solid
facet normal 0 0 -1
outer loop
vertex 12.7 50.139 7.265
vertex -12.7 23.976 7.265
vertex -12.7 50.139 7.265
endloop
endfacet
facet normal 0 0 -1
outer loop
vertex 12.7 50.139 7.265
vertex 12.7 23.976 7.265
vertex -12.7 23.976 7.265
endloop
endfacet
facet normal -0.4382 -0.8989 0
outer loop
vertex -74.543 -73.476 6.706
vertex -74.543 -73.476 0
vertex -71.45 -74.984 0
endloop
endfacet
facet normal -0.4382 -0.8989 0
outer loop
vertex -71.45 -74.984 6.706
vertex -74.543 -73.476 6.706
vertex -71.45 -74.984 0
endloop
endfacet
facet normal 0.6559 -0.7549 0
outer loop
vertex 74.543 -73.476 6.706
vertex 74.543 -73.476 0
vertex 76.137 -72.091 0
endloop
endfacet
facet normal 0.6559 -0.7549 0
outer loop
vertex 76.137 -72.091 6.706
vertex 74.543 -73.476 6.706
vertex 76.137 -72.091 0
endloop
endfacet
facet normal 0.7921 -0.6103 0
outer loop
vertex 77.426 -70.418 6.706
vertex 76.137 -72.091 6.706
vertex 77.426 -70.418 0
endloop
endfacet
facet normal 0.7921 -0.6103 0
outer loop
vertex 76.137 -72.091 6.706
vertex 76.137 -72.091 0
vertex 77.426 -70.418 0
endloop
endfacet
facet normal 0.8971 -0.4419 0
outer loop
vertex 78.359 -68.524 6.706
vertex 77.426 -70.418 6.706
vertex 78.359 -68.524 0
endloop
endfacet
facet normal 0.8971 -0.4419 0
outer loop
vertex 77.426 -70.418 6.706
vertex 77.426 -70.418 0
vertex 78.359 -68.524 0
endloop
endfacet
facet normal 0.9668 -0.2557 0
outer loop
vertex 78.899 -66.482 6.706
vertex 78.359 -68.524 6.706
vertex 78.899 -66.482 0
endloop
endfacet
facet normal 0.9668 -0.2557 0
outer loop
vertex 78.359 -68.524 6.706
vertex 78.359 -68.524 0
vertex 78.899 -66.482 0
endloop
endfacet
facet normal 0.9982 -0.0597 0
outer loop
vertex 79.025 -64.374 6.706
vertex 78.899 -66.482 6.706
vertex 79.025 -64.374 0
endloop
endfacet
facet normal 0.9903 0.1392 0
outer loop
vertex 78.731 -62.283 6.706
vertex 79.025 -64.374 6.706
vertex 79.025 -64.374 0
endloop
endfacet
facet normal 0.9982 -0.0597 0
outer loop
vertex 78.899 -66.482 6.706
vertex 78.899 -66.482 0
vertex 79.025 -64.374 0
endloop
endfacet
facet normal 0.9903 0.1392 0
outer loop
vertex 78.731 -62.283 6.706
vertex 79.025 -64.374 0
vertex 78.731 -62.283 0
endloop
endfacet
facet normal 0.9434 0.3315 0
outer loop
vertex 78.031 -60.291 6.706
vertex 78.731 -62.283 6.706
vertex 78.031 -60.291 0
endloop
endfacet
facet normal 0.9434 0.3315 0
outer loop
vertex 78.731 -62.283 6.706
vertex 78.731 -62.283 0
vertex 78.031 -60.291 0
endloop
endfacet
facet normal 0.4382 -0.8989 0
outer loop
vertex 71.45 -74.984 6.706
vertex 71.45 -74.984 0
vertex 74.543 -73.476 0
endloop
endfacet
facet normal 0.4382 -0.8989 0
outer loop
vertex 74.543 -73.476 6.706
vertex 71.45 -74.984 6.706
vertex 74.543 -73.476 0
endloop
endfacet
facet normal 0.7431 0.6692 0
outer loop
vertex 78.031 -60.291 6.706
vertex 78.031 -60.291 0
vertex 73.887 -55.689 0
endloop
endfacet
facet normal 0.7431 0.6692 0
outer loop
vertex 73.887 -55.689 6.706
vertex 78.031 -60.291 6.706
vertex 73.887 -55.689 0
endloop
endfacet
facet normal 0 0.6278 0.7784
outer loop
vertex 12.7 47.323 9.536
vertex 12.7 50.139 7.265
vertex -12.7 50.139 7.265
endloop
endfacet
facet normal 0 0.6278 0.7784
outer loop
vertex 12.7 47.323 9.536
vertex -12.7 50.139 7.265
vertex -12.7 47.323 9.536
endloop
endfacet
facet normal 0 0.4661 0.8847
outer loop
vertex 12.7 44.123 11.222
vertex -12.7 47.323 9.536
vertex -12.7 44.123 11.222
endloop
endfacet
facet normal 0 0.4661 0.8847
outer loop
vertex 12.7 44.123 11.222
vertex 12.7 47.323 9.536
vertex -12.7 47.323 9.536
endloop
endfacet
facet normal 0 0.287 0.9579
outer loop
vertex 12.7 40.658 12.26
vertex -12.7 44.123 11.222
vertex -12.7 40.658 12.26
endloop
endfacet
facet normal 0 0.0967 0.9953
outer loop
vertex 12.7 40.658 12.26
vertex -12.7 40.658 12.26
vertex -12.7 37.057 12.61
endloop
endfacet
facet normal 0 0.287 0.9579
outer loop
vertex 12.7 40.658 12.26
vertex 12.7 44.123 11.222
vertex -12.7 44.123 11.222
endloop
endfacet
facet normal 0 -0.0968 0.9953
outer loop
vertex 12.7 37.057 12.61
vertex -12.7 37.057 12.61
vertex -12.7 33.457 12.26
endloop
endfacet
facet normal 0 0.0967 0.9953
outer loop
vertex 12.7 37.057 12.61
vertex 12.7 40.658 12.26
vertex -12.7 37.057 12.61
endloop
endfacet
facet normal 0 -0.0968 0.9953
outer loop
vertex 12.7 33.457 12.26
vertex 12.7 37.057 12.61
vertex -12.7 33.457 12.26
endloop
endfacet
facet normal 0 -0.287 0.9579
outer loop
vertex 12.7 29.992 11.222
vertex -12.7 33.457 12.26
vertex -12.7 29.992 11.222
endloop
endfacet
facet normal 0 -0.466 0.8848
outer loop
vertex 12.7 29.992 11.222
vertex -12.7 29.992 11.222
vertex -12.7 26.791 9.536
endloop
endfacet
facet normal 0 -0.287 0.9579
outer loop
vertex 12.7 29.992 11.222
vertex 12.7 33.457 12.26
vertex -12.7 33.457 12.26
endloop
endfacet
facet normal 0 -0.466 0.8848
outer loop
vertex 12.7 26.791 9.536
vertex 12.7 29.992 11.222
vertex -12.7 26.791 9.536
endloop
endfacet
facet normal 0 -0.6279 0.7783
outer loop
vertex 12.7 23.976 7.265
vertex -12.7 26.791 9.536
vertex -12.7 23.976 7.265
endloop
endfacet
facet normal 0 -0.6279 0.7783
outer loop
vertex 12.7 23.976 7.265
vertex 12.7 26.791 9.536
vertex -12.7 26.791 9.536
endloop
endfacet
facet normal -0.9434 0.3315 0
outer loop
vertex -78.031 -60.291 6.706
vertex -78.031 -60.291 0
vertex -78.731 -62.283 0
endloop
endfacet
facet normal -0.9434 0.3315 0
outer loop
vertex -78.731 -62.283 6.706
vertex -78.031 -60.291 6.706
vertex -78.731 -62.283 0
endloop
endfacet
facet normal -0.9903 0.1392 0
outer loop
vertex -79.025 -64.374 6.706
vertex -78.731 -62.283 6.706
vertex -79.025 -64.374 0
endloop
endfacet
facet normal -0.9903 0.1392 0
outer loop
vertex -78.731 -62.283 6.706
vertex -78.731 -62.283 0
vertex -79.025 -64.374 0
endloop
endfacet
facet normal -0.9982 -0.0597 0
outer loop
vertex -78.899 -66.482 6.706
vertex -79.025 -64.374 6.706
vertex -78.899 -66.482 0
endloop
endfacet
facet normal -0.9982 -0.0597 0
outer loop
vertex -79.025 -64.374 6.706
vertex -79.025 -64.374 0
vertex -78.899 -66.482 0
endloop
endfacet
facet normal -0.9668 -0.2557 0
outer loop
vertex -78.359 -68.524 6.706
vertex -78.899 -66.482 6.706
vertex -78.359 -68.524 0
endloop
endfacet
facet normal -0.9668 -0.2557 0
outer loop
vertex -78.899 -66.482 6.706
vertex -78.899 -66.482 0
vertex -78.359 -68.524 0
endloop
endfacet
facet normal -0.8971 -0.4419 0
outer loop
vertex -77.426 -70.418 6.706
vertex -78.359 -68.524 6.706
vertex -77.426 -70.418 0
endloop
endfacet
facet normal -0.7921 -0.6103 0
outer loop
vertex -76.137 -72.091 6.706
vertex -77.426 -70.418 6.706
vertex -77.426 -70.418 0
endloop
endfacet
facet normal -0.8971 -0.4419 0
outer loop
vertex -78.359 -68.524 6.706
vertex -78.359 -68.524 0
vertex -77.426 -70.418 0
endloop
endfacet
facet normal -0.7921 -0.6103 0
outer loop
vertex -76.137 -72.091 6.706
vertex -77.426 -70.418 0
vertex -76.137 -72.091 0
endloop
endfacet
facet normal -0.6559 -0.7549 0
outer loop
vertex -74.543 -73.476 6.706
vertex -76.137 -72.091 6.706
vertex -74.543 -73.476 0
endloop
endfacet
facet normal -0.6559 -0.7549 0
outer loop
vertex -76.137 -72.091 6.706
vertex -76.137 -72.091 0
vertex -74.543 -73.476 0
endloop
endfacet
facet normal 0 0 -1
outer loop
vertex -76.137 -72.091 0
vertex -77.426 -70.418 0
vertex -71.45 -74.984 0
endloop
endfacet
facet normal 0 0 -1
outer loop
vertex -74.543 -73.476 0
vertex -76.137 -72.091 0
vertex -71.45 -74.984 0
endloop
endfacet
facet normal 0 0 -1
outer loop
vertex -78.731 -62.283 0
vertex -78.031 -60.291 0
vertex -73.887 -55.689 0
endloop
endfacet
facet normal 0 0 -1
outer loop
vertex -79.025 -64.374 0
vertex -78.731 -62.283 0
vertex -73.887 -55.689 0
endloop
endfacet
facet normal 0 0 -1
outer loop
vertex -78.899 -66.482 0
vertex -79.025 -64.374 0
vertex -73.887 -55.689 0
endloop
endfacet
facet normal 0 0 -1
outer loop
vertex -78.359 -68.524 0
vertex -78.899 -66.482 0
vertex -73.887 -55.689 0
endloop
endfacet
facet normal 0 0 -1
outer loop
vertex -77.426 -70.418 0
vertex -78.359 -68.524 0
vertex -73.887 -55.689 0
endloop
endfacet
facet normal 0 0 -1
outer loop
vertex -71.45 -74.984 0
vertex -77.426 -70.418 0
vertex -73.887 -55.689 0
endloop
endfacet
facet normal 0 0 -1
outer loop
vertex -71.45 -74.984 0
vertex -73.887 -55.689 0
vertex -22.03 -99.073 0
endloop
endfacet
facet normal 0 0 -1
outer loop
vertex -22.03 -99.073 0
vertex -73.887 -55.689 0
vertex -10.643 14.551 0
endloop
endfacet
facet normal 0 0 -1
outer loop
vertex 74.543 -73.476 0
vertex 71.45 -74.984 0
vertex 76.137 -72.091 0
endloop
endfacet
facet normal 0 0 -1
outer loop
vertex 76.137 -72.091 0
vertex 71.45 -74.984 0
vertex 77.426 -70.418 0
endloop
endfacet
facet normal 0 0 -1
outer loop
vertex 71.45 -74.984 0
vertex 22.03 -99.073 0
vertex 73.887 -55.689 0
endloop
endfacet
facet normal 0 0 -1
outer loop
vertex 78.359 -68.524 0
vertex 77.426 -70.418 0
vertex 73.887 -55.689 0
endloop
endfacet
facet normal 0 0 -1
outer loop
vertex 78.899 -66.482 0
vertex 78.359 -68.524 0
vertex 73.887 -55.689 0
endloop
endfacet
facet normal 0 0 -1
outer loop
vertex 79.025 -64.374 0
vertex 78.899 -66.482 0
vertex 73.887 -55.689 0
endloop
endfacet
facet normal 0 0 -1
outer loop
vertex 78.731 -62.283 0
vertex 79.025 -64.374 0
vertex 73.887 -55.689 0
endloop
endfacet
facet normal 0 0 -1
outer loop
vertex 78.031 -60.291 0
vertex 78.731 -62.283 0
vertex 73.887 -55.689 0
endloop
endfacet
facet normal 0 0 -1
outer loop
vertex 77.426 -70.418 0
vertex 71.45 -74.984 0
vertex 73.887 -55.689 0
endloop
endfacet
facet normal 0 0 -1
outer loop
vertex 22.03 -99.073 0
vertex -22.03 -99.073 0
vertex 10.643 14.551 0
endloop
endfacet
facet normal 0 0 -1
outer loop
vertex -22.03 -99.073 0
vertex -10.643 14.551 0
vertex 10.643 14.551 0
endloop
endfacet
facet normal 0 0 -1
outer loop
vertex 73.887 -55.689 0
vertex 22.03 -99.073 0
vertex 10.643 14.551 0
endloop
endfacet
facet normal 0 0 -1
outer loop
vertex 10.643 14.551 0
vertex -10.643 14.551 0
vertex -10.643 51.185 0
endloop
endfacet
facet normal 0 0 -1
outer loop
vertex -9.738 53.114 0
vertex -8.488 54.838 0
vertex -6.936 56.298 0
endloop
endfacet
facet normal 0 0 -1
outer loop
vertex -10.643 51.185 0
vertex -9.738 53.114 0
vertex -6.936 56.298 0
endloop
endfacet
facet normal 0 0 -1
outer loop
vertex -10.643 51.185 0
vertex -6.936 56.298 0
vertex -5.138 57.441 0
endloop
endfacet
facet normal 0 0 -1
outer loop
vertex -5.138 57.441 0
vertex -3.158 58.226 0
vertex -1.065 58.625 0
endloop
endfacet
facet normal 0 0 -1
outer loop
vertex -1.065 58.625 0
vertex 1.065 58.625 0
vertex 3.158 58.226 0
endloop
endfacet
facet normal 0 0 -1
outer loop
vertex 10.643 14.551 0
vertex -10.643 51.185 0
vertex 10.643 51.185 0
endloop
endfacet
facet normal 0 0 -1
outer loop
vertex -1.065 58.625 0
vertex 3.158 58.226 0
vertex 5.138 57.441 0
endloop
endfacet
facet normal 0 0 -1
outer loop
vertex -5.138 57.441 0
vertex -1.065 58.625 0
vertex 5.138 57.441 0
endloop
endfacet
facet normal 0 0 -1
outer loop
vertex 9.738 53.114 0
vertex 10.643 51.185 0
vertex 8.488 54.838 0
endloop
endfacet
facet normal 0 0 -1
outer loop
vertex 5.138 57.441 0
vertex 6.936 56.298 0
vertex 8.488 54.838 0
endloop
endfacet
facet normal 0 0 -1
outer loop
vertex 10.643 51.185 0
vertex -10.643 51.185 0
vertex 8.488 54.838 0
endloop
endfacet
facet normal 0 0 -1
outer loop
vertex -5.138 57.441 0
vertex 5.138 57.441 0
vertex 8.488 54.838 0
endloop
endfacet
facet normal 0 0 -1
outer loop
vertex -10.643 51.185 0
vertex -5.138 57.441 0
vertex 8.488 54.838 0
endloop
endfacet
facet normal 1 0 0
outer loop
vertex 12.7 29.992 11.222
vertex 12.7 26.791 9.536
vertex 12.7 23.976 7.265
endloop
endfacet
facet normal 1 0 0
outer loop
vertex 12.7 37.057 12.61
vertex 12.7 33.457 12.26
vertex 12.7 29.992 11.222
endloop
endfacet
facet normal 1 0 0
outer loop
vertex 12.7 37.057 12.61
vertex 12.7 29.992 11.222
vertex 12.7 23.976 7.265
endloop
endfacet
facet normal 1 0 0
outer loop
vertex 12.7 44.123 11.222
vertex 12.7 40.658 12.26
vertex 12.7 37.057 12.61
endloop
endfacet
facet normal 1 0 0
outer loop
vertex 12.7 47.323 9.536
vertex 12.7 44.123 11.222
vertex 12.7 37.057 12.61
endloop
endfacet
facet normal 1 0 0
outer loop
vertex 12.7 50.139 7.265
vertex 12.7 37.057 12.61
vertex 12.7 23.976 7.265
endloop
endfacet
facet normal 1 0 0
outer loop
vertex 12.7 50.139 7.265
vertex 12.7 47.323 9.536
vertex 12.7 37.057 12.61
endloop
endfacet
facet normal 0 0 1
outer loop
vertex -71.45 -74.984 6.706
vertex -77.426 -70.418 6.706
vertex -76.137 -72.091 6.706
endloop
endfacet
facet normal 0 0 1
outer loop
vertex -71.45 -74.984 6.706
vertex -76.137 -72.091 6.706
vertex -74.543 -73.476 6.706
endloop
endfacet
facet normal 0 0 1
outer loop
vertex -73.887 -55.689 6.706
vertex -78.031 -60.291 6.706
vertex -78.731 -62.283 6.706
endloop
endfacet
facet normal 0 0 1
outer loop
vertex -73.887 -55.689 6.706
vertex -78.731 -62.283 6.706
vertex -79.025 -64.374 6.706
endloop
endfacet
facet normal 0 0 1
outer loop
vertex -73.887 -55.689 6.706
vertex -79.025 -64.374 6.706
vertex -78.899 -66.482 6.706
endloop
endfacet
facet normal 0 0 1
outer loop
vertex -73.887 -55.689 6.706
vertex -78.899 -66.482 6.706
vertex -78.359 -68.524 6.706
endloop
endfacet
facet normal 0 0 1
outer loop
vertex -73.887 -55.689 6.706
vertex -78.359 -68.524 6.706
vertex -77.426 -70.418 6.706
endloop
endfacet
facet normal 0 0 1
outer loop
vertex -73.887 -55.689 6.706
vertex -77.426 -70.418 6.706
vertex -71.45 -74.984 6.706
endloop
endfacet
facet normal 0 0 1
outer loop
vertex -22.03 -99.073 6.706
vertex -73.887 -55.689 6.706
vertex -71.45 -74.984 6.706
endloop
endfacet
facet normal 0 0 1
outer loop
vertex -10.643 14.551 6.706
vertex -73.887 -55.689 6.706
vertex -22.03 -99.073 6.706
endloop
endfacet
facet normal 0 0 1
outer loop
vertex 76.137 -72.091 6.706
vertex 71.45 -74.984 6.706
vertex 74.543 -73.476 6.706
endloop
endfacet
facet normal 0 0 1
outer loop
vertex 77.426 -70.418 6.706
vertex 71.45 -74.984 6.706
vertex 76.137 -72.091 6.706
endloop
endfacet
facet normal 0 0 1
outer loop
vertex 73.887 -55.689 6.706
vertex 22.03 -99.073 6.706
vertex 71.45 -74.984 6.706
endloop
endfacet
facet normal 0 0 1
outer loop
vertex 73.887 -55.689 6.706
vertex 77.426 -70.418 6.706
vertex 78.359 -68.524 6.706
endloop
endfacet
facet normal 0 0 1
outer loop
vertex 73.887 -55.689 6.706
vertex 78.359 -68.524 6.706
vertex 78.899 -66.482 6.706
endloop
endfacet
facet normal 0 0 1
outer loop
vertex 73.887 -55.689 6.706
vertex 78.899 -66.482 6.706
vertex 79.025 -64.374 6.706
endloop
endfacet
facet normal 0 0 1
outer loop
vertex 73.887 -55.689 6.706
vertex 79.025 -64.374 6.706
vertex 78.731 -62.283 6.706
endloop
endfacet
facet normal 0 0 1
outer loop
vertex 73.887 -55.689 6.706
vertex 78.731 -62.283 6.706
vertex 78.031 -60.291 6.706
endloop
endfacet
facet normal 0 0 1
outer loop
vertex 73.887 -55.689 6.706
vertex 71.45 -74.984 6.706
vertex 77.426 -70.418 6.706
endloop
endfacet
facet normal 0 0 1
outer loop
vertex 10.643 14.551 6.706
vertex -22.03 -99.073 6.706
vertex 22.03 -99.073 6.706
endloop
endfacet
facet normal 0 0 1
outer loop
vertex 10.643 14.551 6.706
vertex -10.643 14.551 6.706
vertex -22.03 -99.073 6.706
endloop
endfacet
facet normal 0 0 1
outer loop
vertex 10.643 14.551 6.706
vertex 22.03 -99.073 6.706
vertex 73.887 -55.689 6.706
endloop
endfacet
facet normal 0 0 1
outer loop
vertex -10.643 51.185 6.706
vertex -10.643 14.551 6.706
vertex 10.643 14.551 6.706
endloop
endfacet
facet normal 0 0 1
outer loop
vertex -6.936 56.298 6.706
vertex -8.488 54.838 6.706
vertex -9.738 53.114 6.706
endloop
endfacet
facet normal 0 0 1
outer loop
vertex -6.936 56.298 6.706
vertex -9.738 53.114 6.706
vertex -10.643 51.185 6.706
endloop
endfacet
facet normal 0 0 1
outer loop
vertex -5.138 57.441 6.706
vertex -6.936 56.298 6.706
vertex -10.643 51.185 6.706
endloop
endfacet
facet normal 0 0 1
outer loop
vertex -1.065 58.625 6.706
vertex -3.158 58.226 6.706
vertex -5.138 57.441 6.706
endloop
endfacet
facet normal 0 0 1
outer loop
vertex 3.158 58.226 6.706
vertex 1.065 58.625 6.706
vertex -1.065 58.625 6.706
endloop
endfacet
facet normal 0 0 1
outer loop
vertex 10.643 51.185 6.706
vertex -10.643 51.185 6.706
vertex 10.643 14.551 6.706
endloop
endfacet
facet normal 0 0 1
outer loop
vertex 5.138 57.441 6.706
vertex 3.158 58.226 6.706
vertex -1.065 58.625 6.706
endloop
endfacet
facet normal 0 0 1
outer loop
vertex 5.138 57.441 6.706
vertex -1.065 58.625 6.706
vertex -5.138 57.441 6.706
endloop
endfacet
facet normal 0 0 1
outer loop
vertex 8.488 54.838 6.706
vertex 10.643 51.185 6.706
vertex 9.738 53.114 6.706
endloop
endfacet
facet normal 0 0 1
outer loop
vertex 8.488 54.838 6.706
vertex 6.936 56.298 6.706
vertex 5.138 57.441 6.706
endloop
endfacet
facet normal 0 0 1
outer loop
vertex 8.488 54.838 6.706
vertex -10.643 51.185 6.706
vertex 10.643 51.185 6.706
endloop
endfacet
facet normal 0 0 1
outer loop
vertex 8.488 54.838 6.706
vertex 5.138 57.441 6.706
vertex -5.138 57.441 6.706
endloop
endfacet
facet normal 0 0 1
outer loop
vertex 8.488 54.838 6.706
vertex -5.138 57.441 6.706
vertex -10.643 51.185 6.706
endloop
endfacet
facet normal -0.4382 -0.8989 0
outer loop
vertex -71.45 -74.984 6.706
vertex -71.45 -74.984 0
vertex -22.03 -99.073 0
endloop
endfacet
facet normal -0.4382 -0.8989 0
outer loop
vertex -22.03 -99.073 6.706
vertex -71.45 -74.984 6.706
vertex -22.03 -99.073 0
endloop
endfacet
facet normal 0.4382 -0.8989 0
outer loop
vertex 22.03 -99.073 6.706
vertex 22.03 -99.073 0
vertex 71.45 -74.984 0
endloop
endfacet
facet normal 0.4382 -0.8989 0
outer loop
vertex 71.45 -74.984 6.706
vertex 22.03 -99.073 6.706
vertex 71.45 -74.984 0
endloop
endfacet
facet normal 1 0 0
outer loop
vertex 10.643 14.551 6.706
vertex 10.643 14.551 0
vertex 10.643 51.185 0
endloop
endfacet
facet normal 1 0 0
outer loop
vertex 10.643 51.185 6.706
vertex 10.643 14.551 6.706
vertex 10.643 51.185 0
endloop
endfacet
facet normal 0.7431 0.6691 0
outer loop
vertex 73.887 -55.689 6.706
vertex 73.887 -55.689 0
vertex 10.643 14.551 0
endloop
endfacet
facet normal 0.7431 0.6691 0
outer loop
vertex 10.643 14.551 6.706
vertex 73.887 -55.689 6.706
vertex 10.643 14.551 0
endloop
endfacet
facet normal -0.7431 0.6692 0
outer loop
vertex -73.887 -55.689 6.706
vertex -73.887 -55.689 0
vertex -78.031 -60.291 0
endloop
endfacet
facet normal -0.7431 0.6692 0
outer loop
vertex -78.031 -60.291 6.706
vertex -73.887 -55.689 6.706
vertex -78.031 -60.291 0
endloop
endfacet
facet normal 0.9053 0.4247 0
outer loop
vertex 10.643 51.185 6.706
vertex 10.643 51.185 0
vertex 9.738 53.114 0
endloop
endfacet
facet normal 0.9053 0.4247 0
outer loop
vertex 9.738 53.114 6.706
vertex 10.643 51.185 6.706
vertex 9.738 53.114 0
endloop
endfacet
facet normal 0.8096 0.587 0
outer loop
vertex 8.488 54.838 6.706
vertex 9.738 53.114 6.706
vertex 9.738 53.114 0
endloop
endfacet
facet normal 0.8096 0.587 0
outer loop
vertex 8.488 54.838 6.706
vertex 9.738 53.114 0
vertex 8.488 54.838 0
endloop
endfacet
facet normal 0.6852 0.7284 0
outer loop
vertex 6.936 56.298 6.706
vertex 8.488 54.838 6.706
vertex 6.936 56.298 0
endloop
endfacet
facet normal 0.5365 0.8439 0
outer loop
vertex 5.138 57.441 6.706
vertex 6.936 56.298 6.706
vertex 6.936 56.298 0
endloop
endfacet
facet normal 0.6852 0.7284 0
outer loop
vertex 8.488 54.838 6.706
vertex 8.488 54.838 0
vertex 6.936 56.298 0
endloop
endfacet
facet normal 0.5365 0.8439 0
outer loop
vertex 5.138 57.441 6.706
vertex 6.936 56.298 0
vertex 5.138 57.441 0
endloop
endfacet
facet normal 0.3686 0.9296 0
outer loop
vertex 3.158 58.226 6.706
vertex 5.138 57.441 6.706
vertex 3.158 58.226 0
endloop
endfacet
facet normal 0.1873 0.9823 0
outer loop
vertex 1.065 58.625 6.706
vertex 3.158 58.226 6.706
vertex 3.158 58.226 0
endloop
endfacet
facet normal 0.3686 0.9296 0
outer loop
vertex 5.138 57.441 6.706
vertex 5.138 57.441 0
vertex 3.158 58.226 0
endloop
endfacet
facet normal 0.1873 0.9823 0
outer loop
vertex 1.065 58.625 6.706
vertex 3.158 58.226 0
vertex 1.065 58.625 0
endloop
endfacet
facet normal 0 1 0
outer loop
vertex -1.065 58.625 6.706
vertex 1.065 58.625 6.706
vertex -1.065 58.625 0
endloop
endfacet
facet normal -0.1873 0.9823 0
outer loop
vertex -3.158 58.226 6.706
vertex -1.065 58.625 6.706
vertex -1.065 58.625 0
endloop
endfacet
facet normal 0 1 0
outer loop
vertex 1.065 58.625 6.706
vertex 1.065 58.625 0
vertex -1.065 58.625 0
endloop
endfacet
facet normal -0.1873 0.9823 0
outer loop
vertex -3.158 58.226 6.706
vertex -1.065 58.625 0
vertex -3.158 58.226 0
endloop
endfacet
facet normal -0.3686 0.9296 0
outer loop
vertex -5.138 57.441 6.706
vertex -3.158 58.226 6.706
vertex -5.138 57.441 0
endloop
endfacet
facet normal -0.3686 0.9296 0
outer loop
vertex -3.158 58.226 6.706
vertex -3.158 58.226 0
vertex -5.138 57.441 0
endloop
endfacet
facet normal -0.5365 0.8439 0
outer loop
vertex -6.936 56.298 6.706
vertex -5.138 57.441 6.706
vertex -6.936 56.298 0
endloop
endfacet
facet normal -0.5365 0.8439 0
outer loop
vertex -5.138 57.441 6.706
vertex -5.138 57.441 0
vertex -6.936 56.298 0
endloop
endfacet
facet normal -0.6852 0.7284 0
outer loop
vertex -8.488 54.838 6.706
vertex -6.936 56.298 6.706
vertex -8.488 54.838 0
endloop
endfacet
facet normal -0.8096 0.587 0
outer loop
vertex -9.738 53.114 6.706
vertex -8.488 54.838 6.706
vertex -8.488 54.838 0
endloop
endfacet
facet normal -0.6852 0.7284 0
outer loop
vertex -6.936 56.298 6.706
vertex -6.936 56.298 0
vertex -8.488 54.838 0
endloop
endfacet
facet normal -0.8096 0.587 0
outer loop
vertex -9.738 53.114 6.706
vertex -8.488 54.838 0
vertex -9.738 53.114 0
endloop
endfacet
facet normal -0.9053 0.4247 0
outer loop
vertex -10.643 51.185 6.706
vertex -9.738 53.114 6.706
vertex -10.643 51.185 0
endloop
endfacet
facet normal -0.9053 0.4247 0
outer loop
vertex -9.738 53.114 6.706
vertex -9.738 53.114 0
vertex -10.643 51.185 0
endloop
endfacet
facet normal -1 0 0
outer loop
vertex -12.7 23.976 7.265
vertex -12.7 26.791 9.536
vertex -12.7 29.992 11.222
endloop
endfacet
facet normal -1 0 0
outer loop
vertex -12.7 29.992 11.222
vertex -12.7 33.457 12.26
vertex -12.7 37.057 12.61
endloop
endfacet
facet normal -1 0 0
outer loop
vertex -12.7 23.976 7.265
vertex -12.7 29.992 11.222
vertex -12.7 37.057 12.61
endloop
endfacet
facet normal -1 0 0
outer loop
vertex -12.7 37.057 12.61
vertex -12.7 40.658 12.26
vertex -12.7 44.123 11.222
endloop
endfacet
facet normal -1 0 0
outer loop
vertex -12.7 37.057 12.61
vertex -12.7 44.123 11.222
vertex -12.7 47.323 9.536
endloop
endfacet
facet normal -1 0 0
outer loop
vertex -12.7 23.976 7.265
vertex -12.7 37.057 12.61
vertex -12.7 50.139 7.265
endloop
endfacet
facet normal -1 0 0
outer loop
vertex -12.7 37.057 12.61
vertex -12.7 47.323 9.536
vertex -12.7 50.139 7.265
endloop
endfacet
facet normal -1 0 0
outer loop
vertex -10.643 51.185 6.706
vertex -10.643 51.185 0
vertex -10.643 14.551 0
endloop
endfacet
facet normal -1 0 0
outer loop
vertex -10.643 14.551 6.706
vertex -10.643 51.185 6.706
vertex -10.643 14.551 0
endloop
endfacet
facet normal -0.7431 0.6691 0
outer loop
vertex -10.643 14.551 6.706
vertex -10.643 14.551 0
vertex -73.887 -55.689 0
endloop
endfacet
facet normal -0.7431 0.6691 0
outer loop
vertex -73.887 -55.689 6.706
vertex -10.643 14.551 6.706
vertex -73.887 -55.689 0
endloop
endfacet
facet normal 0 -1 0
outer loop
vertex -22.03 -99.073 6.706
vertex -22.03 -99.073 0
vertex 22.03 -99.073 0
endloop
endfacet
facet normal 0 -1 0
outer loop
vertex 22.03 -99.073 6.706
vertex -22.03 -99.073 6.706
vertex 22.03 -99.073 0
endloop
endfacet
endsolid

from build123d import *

# Parameters (mm, degrees)
F1_DEPTH = 6.7056
F3_DEPTH = 12.7


with BuildPart() as f1:
    # F0 (on Top) → F1 (new body)
    with BuildSketch(Plane.XY):
        with BuildLine():
            ThreePointArc((10.642839, 51.184798), (0, 58.675642), (-10.642839, 51.184798))
            Line((-10.642839, 51.184798), (-10.642839, 14.551106))
            Line((-10.642839, 14.551106), (-73.88746, -55.689162))
            Line((-73.88746, -55.689162), (-78.030853, -60.290866))
            ThreePointArc((-78.030853, -60.290866), (-78.679434, -67.516349), (-74.543492, -73.476404))
            Line((-74.543492, -73.476404), (-71.450063, -74.984222))
            Line((-71.450063, -74.984222), (-22.029604, -99.073044))
            Line((-22.029604, -99.073044), (0, -99.073044))
            Line((0, -99.073044), (22.029604, -99.073044))
            Line((22.029604, -99.073044), (71.450063, -74.984222))
            Line((71.450063, -74.984222), (74.543492, -73.476404))
            ThreePointArc((74.543492, -73.476404), (78.679434, -67.516349), (78.030853, -60.290866))
            Line((78.030853, -60.290866), (73.88746, -55.689162))
            Line((73.88746, -55.689162), (10.642839, 14.551106))
            Line((10.642839, 14.551106), (10.642839, 51.184798))
        make_face()
    extrude(amount=F1_DEPTH)


with BuildPart() as f3:
    # F2 (on Right) → F3 (new body, symmetric)
    with BuildSketch(Plane.YZ):
        with BuildLine():
            Line((23.976037, 7.264988), (50.138671, 7.264988))
            ThreePointArc((50.138671, 7.264988), (37.057354, 12.609853), (23.976037, 7.264988))
        make_face()
    extrude(amount=F3_DEPTH, both=True)


solid = Compound([f1.part, f3.part])
